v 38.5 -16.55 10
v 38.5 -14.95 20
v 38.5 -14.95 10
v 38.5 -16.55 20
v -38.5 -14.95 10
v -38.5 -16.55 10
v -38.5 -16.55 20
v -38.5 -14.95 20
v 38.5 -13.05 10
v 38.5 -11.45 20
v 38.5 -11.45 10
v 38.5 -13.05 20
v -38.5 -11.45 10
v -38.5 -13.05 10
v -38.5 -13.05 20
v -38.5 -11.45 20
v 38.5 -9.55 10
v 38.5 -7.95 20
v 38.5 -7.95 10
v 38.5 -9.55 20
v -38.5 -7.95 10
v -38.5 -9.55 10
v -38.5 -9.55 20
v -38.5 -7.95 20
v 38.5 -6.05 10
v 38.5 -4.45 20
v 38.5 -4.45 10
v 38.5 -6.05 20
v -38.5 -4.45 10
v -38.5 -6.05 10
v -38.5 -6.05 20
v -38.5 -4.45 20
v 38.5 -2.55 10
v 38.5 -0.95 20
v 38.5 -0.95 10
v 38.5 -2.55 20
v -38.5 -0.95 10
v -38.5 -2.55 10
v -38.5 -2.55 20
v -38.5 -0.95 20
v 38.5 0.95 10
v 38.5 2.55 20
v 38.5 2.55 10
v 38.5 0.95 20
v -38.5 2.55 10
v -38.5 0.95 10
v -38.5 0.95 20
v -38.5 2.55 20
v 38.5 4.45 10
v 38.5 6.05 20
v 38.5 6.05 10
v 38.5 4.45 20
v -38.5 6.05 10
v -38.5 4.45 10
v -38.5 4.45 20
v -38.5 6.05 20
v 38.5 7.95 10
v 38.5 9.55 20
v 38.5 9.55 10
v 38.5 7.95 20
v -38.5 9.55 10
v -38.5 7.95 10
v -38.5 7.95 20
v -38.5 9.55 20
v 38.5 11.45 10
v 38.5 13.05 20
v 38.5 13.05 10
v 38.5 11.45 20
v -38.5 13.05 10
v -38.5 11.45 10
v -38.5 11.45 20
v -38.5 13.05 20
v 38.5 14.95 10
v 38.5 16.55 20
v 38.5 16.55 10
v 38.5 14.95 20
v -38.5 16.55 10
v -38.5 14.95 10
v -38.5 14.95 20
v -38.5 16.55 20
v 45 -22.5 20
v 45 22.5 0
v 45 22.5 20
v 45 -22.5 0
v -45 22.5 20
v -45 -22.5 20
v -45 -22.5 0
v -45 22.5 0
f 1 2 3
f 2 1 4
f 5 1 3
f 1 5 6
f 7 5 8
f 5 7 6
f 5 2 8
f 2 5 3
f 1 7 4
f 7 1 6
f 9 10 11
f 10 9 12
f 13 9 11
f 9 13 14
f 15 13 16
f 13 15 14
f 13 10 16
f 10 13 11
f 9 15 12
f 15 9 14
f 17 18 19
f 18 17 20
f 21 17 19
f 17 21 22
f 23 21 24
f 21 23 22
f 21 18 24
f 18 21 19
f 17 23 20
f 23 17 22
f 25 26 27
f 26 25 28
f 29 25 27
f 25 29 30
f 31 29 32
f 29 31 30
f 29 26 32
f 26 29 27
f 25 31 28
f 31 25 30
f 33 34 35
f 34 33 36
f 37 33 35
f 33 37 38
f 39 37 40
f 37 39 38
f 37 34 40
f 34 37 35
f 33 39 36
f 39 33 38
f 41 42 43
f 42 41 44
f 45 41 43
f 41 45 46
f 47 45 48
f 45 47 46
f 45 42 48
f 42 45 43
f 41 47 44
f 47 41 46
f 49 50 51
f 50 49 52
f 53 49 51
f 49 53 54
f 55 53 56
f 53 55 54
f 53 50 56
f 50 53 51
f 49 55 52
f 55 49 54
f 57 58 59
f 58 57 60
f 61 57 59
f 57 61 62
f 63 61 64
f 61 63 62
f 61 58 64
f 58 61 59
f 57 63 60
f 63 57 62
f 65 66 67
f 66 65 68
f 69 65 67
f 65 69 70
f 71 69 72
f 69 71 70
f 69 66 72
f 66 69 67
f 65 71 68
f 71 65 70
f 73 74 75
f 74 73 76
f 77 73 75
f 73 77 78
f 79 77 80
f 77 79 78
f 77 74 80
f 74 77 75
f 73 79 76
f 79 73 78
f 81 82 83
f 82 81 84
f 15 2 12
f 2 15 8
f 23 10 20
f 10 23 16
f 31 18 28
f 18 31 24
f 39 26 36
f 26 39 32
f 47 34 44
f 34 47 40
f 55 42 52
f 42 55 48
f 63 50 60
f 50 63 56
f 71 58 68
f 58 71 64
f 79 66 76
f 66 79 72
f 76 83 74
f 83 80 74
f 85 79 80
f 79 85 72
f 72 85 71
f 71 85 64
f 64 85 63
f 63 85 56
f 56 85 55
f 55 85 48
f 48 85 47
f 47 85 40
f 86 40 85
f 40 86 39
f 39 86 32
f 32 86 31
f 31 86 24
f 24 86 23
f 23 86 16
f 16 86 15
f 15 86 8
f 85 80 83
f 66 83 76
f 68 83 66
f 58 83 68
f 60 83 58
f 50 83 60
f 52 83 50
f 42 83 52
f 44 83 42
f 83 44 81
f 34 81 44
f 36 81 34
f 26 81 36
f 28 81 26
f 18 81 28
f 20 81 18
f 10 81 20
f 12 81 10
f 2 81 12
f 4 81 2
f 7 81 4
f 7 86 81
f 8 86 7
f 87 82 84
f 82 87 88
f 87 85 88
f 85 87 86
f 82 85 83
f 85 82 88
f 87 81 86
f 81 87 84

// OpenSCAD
// Slide drying rack
// Print orientation: base block on the bed, slots open upward (+Z)

// ---- Block ----
block_l = 90;      // block length along X
block_w = 45;      // block width along Y
block_h = 20;      // block height along Z

// ---- Slots ----
slot_n     = 10;   // number of slots
slot_len   = 77;   // slot length along X
slot_w     = 1.6;  // slot width along Y
slot_d     = 10;   // slot depth into block
slot_pitch = 3.5;  // centre-to-centre spacing in Y
eps        = 0.5;  // overcut past faces

$fn = 64;

difference() {
    // Base block, centred in X/Y, sitting on z = 0
    translate([-block_l/2, -block_w/2, 0])
        cube([block_l, block_w, block_h]);

    // Parallel slots, centred group in X and Y
    for (i = [0 : slot_n - 1]) {
        y = (i - (slot_n - 1)/2) * slot_pitch;
        translate([-slot_len/2, y - slot_w/2, block_h - slot_d])
            cube([slot_len, slot_w, slot_d + eps]);
    }
}
